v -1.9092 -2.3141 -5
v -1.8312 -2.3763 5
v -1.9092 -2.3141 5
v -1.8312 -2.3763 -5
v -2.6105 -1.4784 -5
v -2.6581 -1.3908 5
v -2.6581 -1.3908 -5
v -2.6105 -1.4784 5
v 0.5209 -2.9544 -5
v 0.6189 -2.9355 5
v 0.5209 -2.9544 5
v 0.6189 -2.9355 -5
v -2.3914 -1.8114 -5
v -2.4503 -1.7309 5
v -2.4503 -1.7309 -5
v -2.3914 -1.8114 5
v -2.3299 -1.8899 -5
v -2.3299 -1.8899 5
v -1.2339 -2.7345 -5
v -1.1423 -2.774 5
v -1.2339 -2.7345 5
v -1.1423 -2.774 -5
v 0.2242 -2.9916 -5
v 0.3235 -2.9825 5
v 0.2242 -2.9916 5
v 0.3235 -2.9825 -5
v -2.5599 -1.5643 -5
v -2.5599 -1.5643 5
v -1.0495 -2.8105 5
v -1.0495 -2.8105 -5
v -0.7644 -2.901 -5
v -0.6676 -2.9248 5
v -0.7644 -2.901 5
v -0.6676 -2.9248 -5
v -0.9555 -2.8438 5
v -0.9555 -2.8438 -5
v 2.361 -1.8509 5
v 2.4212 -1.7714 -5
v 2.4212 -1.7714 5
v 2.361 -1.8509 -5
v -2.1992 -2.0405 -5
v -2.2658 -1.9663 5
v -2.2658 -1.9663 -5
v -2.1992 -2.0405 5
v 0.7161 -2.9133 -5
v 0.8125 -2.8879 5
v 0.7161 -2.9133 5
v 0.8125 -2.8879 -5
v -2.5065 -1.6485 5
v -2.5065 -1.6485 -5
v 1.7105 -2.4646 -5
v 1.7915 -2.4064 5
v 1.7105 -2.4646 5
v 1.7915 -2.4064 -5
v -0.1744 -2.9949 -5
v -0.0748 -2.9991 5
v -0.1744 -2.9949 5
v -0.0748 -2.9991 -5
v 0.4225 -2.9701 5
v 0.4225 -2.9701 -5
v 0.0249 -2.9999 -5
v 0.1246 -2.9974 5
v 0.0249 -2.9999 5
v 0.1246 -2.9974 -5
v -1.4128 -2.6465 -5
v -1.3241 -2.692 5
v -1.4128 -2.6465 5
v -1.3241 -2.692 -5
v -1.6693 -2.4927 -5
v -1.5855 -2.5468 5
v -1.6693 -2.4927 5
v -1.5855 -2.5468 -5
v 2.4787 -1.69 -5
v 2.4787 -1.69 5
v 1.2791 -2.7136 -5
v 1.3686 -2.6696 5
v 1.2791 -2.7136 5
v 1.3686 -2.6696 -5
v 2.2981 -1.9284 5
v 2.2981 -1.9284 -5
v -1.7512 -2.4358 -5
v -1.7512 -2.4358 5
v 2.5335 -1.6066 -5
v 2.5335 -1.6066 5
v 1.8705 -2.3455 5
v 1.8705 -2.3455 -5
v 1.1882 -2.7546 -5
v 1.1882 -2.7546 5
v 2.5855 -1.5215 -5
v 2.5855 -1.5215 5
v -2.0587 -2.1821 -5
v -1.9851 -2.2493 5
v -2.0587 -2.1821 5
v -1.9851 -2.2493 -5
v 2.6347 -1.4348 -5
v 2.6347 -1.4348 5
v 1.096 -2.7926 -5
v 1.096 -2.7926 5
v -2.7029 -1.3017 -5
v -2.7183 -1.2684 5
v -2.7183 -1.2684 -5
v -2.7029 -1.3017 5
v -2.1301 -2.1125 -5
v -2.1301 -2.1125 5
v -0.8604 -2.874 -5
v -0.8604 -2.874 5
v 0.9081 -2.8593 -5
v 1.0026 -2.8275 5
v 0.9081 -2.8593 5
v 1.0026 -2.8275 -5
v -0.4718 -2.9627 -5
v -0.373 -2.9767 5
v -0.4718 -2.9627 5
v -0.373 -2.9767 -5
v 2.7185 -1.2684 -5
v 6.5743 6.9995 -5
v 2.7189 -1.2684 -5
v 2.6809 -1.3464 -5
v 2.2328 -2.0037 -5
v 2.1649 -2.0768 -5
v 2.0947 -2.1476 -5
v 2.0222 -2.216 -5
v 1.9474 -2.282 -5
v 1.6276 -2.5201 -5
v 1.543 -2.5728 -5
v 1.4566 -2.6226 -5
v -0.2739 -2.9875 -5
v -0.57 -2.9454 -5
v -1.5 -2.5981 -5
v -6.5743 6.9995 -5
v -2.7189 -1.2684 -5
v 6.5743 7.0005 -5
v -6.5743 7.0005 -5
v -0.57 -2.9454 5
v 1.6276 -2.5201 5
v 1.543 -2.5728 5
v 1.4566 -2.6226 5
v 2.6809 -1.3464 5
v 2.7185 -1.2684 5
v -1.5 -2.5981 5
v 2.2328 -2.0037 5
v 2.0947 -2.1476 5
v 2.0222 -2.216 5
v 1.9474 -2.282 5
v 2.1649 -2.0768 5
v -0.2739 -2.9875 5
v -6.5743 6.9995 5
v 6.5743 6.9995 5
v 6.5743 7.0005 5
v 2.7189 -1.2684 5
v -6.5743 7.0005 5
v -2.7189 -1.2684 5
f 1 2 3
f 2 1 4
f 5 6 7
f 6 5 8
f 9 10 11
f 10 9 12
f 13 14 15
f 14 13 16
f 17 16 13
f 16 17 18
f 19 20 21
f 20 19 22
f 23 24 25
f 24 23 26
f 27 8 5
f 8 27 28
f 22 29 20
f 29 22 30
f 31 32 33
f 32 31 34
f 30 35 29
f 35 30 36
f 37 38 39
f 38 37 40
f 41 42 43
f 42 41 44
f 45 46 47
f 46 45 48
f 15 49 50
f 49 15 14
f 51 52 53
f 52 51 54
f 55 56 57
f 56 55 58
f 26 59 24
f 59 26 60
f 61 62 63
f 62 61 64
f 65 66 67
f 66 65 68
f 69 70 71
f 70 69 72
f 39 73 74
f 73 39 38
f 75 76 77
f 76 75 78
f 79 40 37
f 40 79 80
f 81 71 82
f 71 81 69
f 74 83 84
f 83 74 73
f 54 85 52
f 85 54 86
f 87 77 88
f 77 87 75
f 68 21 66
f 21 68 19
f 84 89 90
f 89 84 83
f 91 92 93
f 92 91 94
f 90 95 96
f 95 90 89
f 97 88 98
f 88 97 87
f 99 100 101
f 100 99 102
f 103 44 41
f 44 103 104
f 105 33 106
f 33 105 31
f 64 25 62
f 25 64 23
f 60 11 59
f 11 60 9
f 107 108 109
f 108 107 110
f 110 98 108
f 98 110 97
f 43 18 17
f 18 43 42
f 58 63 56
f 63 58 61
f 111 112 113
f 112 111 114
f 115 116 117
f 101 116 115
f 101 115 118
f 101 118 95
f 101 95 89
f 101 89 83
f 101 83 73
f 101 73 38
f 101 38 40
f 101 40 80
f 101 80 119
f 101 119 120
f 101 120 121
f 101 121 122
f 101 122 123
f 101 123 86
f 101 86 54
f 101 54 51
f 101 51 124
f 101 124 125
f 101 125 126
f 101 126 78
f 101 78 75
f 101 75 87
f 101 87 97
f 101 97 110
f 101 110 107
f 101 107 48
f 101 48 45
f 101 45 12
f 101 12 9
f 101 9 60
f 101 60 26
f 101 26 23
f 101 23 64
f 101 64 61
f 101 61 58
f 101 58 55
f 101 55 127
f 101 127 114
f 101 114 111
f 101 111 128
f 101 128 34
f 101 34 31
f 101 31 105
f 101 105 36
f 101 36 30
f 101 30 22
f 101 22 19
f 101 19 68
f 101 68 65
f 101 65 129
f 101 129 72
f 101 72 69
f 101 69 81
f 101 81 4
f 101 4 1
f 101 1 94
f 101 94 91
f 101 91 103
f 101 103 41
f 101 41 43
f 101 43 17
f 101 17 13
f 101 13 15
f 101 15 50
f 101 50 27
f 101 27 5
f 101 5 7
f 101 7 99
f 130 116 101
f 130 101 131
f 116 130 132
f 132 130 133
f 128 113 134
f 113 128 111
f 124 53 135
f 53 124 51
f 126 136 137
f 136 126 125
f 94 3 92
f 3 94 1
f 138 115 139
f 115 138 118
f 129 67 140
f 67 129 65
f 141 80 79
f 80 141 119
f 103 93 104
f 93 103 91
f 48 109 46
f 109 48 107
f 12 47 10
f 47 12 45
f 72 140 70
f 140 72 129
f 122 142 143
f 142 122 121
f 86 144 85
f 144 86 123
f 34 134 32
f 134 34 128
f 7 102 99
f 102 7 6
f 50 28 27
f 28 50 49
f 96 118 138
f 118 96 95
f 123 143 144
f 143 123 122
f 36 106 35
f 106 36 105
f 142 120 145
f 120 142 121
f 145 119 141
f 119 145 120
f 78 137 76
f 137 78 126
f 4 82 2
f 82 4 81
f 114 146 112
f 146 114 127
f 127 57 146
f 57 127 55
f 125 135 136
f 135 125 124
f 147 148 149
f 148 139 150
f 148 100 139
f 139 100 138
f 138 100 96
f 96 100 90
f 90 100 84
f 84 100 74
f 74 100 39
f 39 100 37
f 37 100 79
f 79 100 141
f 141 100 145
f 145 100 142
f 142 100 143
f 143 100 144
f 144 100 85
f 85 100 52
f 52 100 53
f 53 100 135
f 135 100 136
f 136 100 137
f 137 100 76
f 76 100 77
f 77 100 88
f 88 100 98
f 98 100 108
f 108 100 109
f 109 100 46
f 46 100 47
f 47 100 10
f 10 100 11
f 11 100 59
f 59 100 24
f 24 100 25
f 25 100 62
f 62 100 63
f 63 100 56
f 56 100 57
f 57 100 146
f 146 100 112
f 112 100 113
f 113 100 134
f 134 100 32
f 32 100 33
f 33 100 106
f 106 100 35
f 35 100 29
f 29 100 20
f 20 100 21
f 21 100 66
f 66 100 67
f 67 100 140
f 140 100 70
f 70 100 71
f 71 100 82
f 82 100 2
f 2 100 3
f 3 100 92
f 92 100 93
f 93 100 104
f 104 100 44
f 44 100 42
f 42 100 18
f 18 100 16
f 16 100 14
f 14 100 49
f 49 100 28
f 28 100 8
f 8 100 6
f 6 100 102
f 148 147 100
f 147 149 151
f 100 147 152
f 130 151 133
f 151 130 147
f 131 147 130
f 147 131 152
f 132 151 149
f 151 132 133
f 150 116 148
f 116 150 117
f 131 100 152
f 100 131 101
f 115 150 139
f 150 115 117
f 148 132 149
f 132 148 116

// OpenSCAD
$fa=0.1;
$fs=0.1;

R=3;
a=25;

module screwLug(r=3,a=25,h=10,th=2*3+4) {
  gap=th-2*r;
  xxx=gap+r*(1+sin(a));
  xx=r*cos(a);
  x=xx+xxx*tan(a);
  translate([0,0,-h/2])
    cylinder(r=r,h=h);
  hull() {
    translate([0,r+gap,0])
      cube([2*x,0.001,h],center=true);
    translate([0,-(xxx-r-gap),0])
      cube([2*xx,0.001,h],center=true);
  }
}

screwLug();
